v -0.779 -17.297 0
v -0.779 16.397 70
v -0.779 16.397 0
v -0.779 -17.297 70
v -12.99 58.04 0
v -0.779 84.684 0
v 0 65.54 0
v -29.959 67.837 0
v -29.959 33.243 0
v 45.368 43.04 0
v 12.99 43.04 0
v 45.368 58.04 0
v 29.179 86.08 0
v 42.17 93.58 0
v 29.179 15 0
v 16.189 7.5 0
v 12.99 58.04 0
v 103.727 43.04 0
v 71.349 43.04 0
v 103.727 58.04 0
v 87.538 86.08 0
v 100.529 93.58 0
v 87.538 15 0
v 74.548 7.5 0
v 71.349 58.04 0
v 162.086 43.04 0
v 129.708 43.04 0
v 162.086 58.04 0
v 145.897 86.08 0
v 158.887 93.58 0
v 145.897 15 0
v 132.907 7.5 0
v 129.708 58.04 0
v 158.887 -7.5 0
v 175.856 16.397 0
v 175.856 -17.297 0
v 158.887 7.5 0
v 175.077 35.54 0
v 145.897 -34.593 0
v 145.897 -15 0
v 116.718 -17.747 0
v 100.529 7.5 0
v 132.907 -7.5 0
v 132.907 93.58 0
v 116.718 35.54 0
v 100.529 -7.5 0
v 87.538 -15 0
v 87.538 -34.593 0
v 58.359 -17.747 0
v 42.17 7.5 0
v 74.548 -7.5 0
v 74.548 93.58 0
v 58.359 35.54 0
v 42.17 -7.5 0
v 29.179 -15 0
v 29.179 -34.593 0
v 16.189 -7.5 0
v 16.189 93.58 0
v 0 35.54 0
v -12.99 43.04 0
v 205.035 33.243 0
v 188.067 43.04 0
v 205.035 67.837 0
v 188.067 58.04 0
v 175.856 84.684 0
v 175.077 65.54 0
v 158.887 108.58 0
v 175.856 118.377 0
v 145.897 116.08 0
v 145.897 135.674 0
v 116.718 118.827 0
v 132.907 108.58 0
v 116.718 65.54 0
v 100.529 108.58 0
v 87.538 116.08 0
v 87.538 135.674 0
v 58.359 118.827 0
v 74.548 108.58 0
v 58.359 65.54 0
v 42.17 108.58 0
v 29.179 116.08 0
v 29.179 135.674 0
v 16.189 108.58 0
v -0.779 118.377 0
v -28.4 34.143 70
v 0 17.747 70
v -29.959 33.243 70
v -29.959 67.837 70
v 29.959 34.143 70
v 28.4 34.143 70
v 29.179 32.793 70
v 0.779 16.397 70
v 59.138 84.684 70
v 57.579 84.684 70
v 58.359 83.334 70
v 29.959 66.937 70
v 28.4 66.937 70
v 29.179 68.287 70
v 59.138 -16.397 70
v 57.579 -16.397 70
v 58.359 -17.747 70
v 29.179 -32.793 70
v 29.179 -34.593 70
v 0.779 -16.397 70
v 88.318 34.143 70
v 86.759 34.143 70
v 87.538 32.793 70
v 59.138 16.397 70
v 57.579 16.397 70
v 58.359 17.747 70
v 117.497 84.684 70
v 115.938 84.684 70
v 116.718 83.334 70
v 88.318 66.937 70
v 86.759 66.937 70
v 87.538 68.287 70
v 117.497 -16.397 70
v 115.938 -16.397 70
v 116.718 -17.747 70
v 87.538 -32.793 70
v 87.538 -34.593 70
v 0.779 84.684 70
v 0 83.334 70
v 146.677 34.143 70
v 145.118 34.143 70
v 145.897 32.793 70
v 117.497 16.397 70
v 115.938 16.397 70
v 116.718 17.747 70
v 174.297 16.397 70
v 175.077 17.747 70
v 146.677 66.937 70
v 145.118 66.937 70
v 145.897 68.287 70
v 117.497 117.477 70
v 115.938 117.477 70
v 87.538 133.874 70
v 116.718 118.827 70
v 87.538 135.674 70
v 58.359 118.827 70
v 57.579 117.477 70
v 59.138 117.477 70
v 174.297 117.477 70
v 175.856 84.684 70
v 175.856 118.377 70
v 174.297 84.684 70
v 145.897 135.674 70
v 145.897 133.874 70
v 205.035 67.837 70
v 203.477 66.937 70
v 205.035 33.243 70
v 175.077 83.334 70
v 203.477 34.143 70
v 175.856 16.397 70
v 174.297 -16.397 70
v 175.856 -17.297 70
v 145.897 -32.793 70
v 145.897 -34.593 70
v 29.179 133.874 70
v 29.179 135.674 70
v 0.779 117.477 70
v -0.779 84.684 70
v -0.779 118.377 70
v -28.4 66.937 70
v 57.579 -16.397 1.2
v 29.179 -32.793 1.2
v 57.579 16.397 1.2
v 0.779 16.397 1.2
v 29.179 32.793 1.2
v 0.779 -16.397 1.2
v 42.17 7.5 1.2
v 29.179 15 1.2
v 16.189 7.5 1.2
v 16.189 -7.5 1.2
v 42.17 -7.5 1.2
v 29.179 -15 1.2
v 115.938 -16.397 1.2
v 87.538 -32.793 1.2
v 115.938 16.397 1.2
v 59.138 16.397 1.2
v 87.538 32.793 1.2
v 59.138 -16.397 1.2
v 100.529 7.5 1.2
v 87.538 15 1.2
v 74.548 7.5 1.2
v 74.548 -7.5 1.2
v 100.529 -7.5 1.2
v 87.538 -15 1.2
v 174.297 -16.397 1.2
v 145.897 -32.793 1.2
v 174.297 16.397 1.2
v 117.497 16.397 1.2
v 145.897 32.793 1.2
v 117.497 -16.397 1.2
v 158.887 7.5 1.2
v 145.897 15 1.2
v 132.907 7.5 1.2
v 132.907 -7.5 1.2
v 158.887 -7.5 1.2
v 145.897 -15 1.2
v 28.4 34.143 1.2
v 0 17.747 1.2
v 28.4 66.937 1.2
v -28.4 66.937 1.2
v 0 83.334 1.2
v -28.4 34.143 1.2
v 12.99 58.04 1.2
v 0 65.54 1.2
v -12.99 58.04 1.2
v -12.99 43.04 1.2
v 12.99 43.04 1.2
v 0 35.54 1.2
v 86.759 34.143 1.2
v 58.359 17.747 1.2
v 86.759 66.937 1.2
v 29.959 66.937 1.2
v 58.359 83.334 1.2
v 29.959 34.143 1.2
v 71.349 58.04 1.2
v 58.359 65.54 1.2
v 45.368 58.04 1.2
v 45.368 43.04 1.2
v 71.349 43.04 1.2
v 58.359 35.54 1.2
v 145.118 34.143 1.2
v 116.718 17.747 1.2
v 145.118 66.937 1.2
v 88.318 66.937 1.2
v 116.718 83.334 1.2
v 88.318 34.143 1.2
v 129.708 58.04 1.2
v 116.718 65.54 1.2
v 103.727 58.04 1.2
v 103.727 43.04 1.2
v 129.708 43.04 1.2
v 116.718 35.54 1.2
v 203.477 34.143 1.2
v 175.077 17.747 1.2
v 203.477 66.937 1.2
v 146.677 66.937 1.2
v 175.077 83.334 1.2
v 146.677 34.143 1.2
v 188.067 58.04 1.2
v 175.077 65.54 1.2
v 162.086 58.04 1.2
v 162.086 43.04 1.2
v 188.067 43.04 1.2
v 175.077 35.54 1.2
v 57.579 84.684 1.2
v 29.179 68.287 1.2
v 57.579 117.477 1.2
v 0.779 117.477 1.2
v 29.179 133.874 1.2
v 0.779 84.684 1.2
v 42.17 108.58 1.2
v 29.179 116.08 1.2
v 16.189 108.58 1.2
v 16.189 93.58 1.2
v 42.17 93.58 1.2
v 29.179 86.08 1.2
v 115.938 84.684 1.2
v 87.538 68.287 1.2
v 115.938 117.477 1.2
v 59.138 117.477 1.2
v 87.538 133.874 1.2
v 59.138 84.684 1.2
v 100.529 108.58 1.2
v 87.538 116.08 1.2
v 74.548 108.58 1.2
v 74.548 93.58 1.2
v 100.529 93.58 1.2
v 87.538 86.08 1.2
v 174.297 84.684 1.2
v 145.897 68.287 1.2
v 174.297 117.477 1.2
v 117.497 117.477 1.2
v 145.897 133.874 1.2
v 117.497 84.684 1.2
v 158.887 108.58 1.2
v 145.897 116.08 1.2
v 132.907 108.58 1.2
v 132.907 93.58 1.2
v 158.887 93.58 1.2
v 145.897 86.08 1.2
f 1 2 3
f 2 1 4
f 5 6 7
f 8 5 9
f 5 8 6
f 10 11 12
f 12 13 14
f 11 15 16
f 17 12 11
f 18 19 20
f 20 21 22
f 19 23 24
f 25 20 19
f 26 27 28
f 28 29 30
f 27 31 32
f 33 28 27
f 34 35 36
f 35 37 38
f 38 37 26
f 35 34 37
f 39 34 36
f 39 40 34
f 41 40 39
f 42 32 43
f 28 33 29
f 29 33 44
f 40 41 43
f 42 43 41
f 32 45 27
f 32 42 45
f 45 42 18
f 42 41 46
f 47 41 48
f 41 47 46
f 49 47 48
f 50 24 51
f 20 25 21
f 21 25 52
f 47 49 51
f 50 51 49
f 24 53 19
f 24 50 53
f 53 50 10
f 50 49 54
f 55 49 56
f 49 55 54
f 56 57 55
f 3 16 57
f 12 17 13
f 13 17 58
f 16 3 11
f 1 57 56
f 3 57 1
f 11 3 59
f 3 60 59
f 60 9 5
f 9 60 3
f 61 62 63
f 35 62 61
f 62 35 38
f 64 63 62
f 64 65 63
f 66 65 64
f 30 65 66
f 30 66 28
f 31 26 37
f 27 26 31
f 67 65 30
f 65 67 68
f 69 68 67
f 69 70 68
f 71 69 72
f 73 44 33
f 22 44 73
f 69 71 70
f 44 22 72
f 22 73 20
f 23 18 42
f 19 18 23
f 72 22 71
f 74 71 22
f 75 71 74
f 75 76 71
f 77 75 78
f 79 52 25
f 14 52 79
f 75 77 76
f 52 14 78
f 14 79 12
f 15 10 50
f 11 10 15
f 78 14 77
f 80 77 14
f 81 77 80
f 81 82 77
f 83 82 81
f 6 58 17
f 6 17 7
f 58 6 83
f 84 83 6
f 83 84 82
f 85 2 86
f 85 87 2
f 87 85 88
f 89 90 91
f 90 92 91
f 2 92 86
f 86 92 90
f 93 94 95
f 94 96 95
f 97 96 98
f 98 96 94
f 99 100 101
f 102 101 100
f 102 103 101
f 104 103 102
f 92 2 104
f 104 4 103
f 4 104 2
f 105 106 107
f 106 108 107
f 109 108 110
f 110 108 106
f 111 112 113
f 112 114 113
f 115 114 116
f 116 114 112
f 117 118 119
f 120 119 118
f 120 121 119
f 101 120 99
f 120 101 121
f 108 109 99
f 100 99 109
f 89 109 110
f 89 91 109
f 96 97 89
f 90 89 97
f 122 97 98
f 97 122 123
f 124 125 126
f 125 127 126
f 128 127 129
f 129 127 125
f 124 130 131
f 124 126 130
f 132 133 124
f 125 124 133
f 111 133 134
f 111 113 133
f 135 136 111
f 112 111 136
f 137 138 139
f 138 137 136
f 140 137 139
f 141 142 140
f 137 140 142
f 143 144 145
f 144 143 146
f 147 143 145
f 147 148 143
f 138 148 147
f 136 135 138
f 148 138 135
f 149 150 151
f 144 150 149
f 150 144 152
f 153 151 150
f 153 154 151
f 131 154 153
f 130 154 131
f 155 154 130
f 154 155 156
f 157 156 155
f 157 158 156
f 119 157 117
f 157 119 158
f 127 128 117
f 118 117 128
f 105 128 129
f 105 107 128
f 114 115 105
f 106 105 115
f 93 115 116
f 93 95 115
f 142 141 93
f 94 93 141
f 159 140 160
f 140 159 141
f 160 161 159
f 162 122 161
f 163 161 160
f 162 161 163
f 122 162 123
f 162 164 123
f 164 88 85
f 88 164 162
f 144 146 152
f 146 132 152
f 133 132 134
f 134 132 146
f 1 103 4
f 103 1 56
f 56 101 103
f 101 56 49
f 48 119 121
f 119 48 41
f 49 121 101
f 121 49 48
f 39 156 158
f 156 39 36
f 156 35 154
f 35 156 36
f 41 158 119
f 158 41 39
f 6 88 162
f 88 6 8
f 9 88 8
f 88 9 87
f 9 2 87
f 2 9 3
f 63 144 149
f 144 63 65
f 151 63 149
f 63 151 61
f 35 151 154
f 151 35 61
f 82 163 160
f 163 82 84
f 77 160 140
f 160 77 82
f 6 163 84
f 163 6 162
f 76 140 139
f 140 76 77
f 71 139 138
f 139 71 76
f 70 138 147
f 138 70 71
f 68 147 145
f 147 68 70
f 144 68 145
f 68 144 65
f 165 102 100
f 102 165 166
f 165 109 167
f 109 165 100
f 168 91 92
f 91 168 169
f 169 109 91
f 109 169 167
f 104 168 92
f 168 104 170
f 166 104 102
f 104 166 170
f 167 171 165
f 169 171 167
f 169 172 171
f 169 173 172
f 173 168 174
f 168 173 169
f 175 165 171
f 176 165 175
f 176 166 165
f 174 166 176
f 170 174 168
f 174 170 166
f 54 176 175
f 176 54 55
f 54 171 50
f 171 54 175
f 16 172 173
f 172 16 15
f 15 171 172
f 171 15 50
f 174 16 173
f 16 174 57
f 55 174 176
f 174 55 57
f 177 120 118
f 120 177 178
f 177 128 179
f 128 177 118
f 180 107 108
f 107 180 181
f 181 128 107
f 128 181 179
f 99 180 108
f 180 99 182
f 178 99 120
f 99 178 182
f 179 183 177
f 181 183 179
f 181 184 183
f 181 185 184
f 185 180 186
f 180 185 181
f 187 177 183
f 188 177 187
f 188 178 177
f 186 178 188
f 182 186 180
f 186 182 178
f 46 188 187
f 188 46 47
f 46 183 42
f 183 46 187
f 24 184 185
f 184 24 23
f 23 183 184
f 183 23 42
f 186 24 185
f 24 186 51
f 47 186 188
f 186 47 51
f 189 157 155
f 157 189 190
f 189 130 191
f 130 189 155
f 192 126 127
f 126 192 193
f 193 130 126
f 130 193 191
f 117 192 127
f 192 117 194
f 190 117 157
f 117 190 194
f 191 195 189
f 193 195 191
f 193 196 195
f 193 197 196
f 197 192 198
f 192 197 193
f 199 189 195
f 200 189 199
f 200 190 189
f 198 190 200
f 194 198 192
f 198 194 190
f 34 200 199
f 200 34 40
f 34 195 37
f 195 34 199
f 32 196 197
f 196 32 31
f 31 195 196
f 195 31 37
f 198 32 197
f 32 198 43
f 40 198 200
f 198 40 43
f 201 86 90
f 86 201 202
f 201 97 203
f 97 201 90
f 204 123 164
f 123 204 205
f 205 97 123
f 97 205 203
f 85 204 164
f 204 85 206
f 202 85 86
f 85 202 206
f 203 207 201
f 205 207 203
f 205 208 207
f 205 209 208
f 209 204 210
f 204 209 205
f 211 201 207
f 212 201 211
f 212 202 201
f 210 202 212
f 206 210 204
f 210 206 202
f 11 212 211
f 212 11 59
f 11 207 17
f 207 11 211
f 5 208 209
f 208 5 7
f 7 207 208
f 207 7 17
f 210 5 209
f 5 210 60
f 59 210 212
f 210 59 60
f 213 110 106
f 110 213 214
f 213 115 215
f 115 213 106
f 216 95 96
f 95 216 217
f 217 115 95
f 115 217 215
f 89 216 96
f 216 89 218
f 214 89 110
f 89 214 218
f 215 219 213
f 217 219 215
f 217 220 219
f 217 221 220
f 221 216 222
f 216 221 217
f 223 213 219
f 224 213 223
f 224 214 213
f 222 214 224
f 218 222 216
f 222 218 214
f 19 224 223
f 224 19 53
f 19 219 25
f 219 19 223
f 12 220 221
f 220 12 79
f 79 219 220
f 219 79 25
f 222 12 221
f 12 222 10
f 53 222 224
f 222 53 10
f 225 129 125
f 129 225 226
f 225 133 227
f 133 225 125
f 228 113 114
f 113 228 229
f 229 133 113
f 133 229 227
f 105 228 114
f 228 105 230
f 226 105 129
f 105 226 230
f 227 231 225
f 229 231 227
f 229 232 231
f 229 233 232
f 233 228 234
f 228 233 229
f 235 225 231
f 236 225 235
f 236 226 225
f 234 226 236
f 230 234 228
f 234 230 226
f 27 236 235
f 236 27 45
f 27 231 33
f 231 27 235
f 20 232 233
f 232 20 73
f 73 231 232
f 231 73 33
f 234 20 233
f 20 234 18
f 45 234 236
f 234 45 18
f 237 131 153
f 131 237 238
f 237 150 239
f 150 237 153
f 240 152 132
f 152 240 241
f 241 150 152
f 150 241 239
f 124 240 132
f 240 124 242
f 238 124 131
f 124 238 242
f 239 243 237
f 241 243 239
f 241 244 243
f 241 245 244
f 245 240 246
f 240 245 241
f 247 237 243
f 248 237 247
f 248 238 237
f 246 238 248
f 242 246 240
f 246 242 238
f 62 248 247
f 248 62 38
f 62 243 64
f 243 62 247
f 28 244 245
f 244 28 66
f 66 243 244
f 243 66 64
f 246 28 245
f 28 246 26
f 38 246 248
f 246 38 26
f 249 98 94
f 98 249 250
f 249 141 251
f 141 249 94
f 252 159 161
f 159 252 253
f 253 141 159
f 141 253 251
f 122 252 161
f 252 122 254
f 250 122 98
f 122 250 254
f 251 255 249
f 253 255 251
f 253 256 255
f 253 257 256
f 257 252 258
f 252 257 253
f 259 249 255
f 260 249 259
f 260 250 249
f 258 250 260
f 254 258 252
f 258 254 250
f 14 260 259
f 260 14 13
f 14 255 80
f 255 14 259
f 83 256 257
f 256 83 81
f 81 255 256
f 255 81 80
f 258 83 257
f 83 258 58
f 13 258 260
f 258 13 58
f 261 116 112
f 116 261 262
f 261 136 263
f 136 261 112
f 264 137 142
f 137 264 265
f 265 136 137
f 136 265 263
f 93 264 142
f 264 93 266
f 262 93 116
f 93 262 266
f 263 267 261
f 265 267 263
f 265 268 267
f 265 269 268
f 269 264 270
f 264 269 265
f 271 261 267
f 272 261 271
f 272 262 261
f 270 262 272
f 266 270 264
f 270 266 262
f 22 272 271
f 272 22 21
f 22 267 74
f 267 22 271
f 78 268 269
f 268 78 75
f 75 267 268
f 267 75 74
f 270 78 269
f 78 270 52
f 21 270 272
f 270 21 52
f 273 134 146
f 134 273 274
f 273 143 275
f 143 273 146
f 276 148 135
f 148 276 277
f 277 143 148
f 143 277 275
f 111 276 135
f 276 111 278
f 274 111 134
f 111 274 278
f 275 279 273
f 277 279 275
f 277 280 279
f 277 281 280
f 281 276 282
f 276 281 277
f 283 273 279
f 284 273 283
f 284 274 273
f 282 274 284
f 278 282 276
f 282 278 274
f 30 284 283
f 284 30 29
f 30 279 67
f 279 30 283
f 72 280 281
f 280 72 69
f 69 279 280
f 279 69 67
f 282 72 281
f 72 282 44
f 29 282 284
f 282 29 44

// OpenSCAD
// -*- mode: SCAD ; c-file-style: "ellemtel" ; coding: utf-8 -*-
//
// Parametric hex-grid incense stick pack tray
//
// © 2017–2020 Roland Sieker <ospalh@gmail.com>
// Licence: CC-BY-SA 4.0
// Loosely based on thingiverse thing  1345795,
// https://www.thingiverse.com/thing:1345795
// by Ian Pegg, https://www.thingiverse.com/deckingman/about
// CC-BY, Feb 2016
// And using an idea (the holes) by Tomas Ebringer
// https://www.thingiverse.com/Shii/about
// https://www.thingiverse.com/thing:1751410
// CC-BY, Sep 2016

/* [Sizes] */

// All length are in mm. This is the size from flat to flat
pack_diameter = 56;  // [8:0.1:90]
// TODO change

// Number of packs in a long row.  Every other row is one position shorter.
x_count = 4;  // [2:1:10]
// Number of rows.
y_count = 3;  //  [2:1:10]

// Start with short row
start_short = true;

// Hight of the walls of the holders
hight = 70; // [8:0.1:150]

// Size of the hole in the bottom of each holder. 0 for no hole, larger than the diameter for just cylinders
hole_diameter = 30; // [0:0.1:91]


/* [Hidden] */

// Done with the customizer

// *******************************************************
// Extra parameters. These can be changed reasonably safely.


w = 1.8;  // Wall width
p = 1.2;  // Bottom, top plate hight
c = 0.4;  // Clearance
angle = 60; // Overhangs much below 60° are a problem for me

// *******************************************************
// Some shortcuts. These shouldn’t be changed


module kmirror(maxis=[1, 0, 0])
{
   // Keep *and* mirror an object. Standard is left and right mirroring.
   children();
   mirror(maxis)
   {
      children();
   }
}

tau = 2 * PI;  // π is still wrong. τ = circumference / r

xy_factor = 1/tan(angle);
// To get from a hight to a horizontal width inclined correctly
z_factor = tan(angle);  // The other way around


ms = 0.01;  // Muggeseggele.

preview = false;
// fn for differently sized objects and fs, fa; all for preview or rendering.
pna = 40;
pnb = 15;
pa = 5;
ps = 1;
rna = 180;
rnb = 30;
ra = 2;
rs = 0.25;
function na() = (preview) ? pna : rna;
function nb() = (preview) ? pnb : rnb;
$fs = (preview) ? ps : rs;
$fa = (preview) ? pa : ra;

// *******************************************************
// End setup



// *******************************************************
// Generate the parts

holder();

// *******************************************************
// Code for the parts themselves


// ***************************************************
// Change below only if you know what you are doing.

thf = sqrt(3)/2;  // (equilateral) triangle hight factor

// r_i = (pack_diameter/2  * thf) + c;
r_i = (pack_diameter/2 + c)/thf;
r_h = hole_diameter/2;
r_o = r_i + w;

// Some of these are redundant here, i think.
x_step = (2*r_i + w)*thf;
y_step = x_step * thf;


module holder()
{
   difference()
   {
      full_shape();
      holes();
   }
}

module full_shape()
{
   for (y_c = [0:y_count-1])
   {
      if ((y_c%2==0) != start_short)
      {
         // Even, long row
         for (x_c = [0:x_count-1])
         {
            one_cylinder(x_c*x_step, y_c*y_step);
         }
      }
      else
      {
         // Odd, short row
         for (x_c = [0:x_count-2])
         {
            one_cylinder((x_c+0.5)*x_step, y_c*y_step);
         }
      }
   }
}


module holes()
{
   for (y_c = [0:y_count-1])
   {
      if ((y_c%2==0) != start_short)
      {
         // Even, long row
         for (x_c = [0:x_count-1])
         {
            one_hole(x_c*x_step, y_c*y_step);
         }
      }
      else
      {
         // Odd, short row
         for (x_c = [0:x_count-2])
         {
            one_hole((x_c+0.5)*x_step, y_c*y_step);
         }
      }
   }
}



module one_hole(x_pos, y_pos)
{
   translate([x_pos, y_pos, 0])
   {
      translate([0, 0, p])
      {
         rotate(30)
         {
            cylinder(r=r_i, h=hight, $fn=6);
         }
      }
      if (hole_diameter)
      {
         translate([0,0, -ms])
         {
            rotate(30)
            {
               cylinder(r=r_h, h=p+2*ms, $fn=6);
            }
         }
      }
   }
}

module one_cylinder(x_pos, y_pos)
{
   translate([x_pos, y_pos, 0])
   {
      rotate(30)
      {
         cylinder(r=r_o, h=hight, $fn=6);
      }
   }
}
